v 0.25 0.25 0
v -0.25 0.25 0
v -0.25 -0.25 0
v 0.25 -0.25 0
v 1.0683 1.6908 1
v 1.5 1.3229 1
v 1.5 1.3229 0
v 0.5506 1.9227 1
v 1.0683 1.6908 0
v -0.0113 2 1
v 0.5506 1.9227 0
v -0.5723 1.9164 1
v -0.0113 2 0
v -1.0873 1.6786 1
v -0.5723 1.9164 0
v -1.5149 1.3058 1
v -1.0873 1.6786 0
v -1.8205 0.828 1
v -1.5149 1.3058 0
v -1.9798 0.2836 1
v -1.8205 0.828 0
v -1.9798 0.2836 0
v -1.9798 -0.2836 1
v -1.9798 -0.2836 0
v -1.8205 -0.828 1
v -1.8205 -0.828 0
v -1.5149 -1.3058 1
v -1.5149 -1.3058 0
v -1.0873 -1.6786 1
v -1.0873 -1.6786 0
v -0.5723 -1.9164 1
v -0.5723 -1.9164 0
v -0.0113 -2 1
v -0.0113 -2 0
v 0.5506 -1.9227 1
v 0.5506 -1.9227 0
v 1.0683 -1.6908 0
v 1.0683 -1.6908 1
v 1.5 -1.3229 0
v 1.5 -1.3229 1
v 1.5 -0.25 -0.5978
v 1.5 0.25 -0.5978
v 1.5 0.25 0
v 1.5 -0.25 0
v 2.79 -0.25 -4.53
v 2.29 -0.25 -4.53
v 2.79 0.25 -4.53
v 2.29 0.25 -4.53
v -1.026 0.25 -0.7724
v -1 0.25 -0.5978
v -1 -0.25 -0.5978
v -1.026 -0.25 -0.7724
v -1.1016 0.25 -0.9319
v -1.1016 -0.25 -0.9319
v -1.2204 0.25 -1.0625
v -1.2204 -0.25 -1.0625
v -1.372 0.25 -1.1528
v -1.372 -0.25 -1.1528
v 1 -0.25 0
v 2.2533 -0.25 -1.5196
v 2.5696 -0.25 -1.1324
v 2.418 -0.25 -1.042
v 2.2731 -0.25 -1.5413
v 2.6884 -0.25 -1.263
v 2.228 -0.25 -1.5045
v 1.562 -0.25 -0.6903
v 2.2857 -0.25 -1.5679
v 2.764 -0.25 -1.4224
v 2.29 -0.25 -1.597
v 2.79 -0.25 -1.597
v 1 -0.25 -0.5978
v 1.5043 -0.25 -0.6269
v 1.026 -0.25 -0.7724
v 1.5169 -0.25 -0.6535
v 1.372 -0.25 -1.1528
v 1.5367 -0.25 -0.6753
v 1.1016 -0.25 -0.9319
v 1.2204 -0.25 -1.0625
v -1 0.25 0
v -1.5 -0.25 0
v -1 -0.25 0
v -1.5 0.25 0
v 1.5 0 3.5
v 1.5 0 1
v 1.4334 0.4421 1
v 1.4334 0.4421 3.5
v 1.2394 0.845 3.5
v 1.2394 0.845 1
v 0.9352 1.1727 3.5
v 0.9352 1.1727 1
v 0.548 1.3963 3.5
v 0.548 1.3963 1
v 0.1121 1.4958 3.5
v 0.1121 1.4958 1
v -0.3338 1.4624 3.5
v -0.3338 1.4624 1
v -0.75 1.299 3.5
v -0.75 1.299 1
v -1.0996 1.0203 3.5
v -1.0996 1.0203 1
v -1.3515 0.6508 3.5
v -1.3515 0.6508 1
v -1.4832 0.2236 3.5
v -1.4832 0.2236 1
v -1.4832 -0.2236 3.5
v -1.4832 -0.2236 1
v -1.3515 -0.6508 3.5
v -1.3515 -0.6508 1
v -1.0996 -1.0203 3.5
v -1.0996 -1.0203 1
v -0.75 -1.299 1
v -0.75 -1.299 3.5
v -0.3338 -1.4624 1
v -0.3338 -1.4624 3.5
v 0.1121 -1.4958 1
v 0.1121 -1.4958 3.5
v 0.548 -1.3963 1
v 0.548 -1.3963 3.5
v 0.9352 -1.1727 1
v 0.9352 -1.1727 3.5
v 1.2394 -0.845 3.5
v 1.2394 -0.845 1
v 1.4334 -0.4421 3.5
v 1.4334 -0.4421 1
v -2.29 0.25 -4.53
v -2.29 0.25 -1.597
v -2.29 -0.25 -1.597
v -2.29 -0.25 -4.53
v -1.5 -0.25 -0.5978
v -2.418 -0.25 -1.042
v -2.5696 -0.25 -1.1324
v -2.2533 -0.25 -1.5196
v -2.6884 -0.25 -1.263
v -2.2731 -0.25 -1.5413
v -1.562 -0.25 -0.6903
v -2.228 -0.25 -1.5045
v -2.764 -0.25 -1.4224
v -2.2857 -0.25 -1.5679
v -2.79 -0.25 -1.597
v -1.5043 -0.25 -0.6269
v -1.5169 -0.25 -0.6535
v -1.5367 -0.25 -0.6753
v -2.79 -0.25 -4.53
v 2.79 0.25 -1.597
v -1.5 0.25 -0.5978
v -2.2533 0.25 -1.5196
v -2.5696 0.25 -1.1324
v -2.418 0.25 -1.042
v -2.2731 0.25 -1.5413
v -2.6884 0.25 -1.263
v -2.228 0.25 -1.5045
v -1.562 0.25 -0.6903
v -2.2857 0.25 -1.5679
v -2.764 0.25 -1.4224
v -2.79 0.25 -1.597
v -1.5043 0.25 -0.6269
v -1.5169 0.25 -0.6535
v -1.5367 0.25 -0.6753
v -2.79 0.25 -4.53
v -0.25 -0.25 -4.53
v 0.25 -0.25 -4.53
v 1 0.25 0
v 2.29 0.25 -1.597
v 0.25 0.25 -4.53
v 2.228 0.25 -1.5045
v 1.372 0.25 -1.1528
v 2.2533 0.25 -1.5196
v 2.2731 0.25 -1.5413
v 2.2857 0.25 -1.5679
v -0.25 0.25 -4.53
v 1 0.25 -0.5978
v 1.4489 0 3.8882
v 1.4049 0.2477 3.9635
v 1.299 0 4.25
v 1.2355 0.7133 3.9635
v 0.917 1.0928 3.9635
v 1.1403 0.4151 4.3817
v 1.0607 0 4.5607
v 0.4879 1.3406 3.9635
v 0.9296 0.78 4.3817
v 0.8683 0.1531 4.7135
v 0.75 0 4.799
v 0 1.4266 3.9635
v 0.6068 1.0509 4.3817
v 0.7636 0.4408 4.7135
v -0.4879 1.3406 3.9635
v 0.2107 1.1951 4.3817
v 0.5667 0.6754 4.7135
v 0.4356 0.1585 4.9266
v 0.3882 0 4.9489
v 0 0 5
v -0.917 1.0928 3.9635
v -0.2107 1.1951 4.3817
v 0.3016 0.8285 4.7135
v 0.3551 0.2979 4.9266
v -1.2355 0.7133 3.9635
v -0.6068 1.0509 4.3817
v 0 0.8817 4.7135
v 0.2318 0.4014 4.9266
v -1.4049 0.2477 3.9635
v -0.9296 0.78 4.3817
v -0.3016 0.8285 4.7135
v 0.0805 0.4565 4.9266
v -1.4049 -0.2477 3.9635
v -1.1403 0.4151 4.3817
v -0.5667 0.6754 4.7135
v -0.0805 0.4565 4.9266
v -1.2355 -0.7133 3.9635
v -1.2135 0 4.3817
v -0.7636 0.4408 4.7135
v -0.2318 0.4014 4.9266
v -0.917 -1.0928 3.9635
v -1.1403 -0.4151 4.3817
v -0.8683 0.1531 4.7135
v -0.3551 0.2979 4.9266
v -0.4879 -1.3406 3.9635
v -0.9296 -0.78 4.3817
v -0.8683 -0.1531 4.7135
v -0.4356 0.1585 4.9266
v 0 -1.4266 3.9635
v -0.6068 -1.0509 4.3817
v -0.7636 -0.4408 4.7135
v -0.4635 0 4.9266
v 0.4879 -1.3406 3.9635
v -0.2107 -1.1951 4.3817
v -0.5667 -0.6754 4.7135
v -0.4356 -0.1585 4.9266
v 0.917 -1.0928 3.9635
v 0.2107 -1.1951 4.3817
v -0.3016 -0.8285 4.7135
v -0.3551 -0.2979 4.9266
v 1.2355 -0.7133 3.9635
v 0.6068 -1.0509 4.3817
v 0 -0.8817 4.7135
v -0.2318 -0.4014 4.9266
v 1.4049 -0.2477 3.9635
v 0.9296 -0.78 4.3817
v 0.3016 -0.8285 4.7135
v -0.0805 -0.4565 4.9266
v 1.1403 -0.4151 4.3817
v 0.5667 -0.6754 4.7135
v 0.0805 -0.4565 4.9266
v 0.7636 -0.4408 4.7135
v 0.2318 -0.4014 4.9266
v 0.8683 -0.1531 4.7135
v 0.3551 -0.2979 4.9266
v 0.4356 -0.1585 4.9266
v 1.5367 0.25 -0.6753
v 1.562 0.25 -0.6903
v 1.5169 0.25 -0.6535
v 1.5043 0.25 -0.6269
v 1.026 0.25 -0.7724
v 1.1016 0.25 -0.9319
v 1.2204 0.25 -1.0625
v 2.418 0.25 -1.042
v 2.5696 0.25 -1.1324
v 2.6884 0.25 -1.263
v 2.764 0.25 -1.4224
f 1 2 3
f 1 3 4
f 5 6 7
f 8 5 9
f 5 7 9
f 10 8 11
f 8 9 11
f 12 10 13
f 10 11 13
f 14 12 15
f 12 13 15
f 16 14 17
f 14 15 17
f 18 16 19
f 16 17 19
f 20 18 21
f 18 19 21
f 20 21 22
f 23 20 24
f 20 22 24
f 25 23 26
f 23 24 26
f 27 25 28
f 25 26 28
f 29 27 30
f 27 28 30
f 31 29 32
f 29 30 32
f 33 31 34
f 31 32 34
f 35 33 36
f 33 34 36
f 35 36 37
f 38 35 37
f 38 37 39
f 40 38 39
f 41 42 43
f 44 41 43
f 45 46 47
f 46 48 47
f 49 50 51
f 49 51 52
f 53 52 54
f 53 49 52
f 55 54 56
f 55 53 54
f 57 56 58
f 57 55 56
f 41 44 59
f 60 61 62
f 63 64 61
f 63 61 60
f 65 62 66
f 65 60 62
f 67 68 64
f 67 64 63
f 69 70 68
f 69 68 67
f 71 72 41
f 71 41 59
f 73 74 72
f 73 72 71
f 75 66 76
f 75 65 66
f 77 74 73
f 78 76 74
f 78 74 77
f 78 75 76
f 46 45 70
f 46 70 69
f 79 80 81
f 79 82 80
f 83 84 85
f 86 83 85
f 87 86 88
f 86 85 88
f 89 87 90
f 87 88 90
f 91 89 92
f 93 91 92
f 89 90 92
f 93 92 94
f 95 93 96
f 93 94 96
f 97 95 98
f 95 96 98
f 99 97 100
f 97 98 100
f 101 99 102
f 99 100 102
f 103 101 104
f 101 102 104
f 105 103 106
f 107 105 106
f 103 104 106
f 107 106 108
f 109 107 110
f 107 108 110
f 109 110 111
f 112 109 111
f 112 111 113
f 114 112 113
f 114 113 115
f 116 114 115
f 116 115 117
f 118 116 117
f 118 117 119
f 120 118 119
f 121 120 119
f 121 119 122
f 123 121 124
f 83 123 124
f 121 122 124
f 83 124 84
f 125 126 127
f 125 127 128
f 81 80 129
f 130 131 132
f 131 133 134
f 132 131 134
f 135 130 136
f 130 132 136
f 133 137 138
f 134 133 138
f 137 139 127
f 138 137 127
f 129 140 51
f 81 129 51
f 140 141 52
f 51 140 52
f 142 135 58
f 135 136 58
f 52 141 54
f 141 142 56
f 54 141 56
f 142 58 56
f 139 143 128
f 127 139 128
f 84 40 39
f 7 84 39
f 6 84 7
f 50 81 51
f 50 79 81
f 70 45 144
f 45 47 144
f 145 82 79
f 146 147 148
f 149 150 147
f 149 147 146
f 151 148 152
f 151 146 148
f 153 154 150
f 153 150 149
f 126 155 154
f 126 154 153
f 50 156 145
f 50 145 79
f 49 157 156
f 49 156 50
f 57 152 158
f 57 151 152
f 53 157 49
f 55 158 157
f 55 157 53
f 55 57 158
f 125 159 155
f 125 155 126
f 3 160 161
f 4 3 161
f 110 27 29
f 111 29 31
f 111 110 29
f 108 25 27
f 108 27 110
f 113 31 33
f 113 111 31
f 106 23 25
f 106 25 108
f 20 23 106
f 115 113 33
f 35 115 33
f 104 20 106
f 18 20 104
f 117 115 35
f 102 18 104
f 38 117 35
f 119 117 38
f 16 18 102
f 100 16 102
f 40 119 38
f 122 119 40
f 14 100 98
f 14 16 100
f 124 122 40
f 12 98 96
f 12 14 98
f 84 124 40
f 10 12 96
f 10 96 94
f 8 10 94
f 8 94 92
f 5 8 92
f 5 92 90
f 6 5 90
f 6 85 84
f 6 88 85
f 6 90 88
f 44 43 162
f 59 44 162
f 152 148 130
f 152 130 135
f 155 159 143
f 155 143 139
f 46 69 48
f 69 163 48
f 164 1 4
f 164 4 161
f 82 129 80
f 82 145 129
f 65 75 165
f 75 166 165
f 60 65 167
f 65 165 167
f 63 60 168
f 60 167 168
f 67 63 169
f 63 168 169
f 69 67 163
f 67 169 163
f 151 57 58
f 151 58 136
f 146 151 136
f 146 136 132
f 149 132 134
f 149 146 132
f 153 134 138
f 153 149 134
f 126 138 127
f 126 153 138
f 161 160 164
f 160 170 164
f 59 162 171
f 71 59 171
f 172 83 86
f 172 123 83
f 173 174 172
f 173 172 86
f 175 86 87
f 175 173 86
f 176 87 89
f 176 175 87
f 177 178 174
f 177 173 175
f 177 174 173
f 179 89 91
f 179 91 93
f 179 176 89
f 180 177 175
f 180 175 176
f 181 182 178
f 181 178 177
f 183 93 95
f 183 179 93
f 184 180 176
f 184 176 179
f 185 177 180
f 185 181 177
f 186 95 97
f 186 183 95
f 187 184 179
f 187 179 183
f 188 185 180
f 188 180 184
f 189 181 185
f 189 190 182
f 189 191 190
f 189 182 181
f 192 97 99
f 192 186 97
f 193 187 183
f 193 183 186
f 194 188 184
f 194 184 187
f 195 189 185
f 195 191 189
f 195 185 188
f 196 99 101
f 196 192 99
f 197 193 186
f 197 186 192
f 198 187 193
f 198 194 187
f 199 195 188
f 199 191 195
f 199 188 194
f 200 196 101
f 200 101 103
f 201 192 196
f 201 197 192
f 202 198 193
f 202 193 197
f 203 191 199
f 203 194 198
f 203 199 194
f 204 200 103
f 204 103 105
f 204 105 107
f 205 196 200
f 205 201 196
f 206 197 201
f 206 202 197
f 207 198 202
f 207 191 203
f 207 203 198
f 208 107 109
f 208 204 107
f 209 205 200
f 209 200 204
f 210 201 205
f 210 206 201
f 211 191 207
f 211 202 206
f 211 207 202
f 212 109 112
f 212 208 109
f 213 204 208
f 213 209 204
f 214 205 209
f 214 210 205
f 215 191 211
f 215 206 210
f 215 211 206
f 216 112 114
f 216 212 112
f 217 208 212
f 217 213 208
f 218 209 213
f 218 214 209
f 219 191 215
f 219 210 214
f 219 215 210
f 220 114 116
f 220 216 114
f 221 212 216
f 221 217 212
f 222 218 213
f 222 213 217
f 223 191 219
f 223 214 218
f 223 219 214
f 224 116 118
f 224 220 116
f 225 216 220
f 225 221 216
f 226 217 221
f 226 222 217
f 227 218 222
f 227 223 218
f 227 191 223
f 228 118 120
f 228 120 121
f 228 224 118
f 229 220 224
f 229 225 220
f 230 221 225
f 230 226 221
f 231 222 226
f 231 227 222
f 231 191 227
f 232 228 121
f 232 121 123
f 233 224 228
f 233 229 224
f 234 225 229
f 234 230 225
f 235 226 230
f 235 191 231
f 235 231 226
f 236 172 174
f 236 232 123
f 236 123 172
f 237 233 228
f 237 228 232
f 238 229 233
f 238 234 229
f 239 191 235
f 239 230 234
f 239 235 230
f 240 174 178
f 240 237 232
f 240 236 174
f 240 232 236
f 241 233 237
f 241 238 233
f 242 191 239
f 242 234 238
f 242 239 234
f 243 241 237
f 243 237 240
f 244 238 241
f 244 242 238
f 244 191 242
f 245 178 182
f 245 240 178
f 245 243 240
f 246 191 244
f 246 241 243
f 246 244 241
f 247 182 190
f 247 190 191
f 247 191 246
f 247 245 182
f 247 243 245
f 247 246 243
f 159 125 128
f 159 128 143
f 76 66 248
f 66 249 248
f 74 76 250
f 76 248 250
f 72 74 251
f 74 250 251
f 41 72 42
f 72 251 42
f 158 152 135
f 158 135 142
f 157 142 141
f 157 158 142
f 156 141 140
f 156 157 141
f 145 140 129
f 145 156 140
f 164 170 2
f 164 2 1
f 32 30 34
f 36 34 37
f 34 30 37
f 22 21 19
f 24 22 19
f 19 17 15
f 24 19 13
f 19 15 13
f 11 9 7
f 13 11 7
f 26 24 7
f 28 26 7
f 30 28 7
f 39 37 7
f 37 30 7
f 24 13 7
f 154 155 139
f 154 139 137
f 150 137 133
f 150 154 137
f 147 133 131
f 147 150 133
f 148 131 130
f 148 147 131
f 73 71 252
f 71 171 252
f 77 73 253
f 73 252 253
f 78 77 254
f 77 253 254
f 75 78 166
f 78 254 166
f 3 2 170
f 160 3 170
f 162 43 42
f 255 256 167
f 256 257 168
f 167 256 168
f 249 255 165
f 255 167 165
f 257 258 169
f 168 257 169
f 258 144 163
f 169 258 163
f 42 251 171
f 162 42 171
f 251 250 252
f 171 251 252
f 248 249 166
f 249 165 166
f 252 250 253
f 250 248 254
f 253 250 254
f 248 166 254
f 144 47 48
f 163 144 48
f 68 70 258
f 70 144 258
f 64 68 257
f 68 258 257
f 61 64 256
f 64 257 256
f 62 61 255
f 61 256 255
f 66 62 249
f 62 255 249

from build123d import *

# Parameters (mm, degrees)
SKETCH1_R           = 2
BOSS_EXTRUDE1_DEPTH = 1
SKETCH2_R           = 1.5
BOSS_EXTRUDE2_DEPTH = 2.5
DOME1_FACE_RADIUS   = 1.5
DOME1_HEIGHT        = 1.5
CUT_EXTRUDE1_REACH  = 6.899
SKETCH3_W           = 0.5
SKETCH3_H           = 4.031292186
SKETCH8_W           = 0.5
SKETCH8_H           = 4.53
BASE_FLANGE1_DEPTH  = 0.25
BASE_FLANGE2_DEPTH  = 0.25
BASE_FLANGE3_DEPTH  = 0.25


# Sheet-metal steps are written as plain solids
with BuildPart() as part:
    # Sketch1 → Boss-Extrude1 (new body)
    with BuildSketch(Plane.XY):
        Circle(SKETCH1_R)
    extrude(amount=BOSS_EXTRUDE1_DEPTH)

    # Sketch2 → Boss-Extrude2 (add)
    with BuildSketch(Plane.XY.offset(1)):
        Circle(SKETCH2_R)
    extrude(amount=BOSS_EXTRUDE2_DEPTH)

    # Dome1: a dome of height H over a round flat face of radius A is a cap of a sphere of radius (A * A + H * H) / (2 * H)
    dome1_r = (DOME1_FACE_RADIUS * DOME1_FACE_RADIUS + DOME1_HEIGHT * DOME1_HEIGHT) / (2 * DOME1_HEIGHT)
    dome1_base = Plane((0, 0, 3.5), z_dir=(0, 0, 1))
    with Locations(dome1_base.offset(DOME1_HEIGHT - dome1_r)):
        dome1_ball = Sphere(dome1_r, mode=Mode.PRIVATE)
    add(split(dome1_ball, bisect_by=dome1_base, keep=Keep.TOP, mode=Mode.PRIVATE))

    # Sketch3 → Cut-Extrude1 (cut, up to next)
    with BuildSketch(Plane.XY.offset(1), mode=Mode.PRIVATE) as cut_extrude1_sk1:
        with Locations((1.75, -0.165370345)):
            Rectangle(SKETCH3_W, SKETCH3_H)
    cut_extrude1_tool1 = extrude(cut_extrude1_sk1.sketch, amount=-CUT_EXTRUDE1_REACH, mode=Mode.PRIVATE) & part.part
    add(cut_extrude1_tool1.solids().sort_by_distance((1.75, -0.16537, 1))[0], mode=Mode.SUBTRACT)


with BuildPart() as body_2:
    # Sketch8 → Base-Flange1 (new, symmetric)
    with BuildSketch(Plane(origin=(0, 0, 0), x_dir=(1, 0, 0), z_dir=(0, 1, 0))):
        with Locations((0, 2.265)):
            Rectangle(SKETCH8_W, SKETCH8_H)
    extrude(amount=BASE_FLANGE1_DEPTH, both=True)


with BuildPart() as body_3:
    # Sketch11 → Base-Flange2 (new, symmetric)
    with BuildSketch(Plane(origin=(0, 0, 0), x_dir=(1, 0, 0), z_dir=(0, 1, 0))):
        with BuildLine():
            Line((1, 0), (1, 0.597845317))
            ThreePointArc((1, 0.597845317), (1.101597438, 0.931903524), (1.371982953, 1.152830205))
            Line((1.371982953, 1.152830205), (2.228002841, 1.504528299))
            ThreePointArc((2.228002841, 1.504528299), (2.273067094, 1.541349413), (2.29, 1.59702578))
            Line((2.29, 1.59702578), (2.29, 4.53))
            Line((2.29, 4.53), (2.79, 4.53))
            Line((2.79, 4.53), (2.79, 1.59702578))
            ThreePointArc((2.79, 1.59702578), (2.688402562, 1.262967573), (2.418017047, 1.042040892))
            Line((2.418017047, 1.042040892), (1.561997159, 0.690342799))
            ThreePointArc((1.561997159, 0.690342799), (1.516932906, 0.653521685), (1.5, 0.597845317))
            Line((1.5, 0.597845317), (1.5, 0))
            Line((1.5, 0), (1, 0))
        make_face()
    extrude(amount=BASE_FLANGE2_DEPTH, both=True)


with BuildPart() as body_4:
    # Sketch14 → Base-Flange3 (new, symmetric)
    with BuildSketch(Plane(origin=(0, 0, 0), x_dir=(1, 0, 0), z_dir=(0, 1, 0))):
        with BuildLine():
            Line((-1, 0), (-1, 0.597845317))
            ThreePointArc((-1, 0.597845317), (-1.101597438, 0.931903524), (-1.371982953, 1.152830205))
            Line((-1.371982953, 1.152830205), (-2.228002841, 1.504528299))
            ThreePointArc((-2.228002841, 1.504528299), (-2.273067094, 1.541349413), (-2.29, 1.59702578))
            Line((-2.29, 1.59702578), (-2.29, 4.53))
            Line((-2.29, 4.53), (-2.79, 4.53))
            Line((-2.79, 4.53), (-2.79, 1.59702578))
            ThreePointArc((-2.79, 1.59702578), (-2.688402562, 1.262967573), (-2.418017047, 1.042040892))
            Line((-2.418017047, 1.042040892), (-1.561997159, 0.690342799))
            ThreePointArc((-1.561997159, 0.690342799), (-1.516932906, 0.653521685), (-1.5, 0.597845317))
            Line((-1.5, 0.597845317), (-1.5, 0))
            Line((-1.5, 0), (-1, 0))
        make_face()
    extrude(amount=BASE_FLANGE3_DEPTH, both=True)


solid = Compound([part.part, body_2.part, body_3.part, body_4.part])
